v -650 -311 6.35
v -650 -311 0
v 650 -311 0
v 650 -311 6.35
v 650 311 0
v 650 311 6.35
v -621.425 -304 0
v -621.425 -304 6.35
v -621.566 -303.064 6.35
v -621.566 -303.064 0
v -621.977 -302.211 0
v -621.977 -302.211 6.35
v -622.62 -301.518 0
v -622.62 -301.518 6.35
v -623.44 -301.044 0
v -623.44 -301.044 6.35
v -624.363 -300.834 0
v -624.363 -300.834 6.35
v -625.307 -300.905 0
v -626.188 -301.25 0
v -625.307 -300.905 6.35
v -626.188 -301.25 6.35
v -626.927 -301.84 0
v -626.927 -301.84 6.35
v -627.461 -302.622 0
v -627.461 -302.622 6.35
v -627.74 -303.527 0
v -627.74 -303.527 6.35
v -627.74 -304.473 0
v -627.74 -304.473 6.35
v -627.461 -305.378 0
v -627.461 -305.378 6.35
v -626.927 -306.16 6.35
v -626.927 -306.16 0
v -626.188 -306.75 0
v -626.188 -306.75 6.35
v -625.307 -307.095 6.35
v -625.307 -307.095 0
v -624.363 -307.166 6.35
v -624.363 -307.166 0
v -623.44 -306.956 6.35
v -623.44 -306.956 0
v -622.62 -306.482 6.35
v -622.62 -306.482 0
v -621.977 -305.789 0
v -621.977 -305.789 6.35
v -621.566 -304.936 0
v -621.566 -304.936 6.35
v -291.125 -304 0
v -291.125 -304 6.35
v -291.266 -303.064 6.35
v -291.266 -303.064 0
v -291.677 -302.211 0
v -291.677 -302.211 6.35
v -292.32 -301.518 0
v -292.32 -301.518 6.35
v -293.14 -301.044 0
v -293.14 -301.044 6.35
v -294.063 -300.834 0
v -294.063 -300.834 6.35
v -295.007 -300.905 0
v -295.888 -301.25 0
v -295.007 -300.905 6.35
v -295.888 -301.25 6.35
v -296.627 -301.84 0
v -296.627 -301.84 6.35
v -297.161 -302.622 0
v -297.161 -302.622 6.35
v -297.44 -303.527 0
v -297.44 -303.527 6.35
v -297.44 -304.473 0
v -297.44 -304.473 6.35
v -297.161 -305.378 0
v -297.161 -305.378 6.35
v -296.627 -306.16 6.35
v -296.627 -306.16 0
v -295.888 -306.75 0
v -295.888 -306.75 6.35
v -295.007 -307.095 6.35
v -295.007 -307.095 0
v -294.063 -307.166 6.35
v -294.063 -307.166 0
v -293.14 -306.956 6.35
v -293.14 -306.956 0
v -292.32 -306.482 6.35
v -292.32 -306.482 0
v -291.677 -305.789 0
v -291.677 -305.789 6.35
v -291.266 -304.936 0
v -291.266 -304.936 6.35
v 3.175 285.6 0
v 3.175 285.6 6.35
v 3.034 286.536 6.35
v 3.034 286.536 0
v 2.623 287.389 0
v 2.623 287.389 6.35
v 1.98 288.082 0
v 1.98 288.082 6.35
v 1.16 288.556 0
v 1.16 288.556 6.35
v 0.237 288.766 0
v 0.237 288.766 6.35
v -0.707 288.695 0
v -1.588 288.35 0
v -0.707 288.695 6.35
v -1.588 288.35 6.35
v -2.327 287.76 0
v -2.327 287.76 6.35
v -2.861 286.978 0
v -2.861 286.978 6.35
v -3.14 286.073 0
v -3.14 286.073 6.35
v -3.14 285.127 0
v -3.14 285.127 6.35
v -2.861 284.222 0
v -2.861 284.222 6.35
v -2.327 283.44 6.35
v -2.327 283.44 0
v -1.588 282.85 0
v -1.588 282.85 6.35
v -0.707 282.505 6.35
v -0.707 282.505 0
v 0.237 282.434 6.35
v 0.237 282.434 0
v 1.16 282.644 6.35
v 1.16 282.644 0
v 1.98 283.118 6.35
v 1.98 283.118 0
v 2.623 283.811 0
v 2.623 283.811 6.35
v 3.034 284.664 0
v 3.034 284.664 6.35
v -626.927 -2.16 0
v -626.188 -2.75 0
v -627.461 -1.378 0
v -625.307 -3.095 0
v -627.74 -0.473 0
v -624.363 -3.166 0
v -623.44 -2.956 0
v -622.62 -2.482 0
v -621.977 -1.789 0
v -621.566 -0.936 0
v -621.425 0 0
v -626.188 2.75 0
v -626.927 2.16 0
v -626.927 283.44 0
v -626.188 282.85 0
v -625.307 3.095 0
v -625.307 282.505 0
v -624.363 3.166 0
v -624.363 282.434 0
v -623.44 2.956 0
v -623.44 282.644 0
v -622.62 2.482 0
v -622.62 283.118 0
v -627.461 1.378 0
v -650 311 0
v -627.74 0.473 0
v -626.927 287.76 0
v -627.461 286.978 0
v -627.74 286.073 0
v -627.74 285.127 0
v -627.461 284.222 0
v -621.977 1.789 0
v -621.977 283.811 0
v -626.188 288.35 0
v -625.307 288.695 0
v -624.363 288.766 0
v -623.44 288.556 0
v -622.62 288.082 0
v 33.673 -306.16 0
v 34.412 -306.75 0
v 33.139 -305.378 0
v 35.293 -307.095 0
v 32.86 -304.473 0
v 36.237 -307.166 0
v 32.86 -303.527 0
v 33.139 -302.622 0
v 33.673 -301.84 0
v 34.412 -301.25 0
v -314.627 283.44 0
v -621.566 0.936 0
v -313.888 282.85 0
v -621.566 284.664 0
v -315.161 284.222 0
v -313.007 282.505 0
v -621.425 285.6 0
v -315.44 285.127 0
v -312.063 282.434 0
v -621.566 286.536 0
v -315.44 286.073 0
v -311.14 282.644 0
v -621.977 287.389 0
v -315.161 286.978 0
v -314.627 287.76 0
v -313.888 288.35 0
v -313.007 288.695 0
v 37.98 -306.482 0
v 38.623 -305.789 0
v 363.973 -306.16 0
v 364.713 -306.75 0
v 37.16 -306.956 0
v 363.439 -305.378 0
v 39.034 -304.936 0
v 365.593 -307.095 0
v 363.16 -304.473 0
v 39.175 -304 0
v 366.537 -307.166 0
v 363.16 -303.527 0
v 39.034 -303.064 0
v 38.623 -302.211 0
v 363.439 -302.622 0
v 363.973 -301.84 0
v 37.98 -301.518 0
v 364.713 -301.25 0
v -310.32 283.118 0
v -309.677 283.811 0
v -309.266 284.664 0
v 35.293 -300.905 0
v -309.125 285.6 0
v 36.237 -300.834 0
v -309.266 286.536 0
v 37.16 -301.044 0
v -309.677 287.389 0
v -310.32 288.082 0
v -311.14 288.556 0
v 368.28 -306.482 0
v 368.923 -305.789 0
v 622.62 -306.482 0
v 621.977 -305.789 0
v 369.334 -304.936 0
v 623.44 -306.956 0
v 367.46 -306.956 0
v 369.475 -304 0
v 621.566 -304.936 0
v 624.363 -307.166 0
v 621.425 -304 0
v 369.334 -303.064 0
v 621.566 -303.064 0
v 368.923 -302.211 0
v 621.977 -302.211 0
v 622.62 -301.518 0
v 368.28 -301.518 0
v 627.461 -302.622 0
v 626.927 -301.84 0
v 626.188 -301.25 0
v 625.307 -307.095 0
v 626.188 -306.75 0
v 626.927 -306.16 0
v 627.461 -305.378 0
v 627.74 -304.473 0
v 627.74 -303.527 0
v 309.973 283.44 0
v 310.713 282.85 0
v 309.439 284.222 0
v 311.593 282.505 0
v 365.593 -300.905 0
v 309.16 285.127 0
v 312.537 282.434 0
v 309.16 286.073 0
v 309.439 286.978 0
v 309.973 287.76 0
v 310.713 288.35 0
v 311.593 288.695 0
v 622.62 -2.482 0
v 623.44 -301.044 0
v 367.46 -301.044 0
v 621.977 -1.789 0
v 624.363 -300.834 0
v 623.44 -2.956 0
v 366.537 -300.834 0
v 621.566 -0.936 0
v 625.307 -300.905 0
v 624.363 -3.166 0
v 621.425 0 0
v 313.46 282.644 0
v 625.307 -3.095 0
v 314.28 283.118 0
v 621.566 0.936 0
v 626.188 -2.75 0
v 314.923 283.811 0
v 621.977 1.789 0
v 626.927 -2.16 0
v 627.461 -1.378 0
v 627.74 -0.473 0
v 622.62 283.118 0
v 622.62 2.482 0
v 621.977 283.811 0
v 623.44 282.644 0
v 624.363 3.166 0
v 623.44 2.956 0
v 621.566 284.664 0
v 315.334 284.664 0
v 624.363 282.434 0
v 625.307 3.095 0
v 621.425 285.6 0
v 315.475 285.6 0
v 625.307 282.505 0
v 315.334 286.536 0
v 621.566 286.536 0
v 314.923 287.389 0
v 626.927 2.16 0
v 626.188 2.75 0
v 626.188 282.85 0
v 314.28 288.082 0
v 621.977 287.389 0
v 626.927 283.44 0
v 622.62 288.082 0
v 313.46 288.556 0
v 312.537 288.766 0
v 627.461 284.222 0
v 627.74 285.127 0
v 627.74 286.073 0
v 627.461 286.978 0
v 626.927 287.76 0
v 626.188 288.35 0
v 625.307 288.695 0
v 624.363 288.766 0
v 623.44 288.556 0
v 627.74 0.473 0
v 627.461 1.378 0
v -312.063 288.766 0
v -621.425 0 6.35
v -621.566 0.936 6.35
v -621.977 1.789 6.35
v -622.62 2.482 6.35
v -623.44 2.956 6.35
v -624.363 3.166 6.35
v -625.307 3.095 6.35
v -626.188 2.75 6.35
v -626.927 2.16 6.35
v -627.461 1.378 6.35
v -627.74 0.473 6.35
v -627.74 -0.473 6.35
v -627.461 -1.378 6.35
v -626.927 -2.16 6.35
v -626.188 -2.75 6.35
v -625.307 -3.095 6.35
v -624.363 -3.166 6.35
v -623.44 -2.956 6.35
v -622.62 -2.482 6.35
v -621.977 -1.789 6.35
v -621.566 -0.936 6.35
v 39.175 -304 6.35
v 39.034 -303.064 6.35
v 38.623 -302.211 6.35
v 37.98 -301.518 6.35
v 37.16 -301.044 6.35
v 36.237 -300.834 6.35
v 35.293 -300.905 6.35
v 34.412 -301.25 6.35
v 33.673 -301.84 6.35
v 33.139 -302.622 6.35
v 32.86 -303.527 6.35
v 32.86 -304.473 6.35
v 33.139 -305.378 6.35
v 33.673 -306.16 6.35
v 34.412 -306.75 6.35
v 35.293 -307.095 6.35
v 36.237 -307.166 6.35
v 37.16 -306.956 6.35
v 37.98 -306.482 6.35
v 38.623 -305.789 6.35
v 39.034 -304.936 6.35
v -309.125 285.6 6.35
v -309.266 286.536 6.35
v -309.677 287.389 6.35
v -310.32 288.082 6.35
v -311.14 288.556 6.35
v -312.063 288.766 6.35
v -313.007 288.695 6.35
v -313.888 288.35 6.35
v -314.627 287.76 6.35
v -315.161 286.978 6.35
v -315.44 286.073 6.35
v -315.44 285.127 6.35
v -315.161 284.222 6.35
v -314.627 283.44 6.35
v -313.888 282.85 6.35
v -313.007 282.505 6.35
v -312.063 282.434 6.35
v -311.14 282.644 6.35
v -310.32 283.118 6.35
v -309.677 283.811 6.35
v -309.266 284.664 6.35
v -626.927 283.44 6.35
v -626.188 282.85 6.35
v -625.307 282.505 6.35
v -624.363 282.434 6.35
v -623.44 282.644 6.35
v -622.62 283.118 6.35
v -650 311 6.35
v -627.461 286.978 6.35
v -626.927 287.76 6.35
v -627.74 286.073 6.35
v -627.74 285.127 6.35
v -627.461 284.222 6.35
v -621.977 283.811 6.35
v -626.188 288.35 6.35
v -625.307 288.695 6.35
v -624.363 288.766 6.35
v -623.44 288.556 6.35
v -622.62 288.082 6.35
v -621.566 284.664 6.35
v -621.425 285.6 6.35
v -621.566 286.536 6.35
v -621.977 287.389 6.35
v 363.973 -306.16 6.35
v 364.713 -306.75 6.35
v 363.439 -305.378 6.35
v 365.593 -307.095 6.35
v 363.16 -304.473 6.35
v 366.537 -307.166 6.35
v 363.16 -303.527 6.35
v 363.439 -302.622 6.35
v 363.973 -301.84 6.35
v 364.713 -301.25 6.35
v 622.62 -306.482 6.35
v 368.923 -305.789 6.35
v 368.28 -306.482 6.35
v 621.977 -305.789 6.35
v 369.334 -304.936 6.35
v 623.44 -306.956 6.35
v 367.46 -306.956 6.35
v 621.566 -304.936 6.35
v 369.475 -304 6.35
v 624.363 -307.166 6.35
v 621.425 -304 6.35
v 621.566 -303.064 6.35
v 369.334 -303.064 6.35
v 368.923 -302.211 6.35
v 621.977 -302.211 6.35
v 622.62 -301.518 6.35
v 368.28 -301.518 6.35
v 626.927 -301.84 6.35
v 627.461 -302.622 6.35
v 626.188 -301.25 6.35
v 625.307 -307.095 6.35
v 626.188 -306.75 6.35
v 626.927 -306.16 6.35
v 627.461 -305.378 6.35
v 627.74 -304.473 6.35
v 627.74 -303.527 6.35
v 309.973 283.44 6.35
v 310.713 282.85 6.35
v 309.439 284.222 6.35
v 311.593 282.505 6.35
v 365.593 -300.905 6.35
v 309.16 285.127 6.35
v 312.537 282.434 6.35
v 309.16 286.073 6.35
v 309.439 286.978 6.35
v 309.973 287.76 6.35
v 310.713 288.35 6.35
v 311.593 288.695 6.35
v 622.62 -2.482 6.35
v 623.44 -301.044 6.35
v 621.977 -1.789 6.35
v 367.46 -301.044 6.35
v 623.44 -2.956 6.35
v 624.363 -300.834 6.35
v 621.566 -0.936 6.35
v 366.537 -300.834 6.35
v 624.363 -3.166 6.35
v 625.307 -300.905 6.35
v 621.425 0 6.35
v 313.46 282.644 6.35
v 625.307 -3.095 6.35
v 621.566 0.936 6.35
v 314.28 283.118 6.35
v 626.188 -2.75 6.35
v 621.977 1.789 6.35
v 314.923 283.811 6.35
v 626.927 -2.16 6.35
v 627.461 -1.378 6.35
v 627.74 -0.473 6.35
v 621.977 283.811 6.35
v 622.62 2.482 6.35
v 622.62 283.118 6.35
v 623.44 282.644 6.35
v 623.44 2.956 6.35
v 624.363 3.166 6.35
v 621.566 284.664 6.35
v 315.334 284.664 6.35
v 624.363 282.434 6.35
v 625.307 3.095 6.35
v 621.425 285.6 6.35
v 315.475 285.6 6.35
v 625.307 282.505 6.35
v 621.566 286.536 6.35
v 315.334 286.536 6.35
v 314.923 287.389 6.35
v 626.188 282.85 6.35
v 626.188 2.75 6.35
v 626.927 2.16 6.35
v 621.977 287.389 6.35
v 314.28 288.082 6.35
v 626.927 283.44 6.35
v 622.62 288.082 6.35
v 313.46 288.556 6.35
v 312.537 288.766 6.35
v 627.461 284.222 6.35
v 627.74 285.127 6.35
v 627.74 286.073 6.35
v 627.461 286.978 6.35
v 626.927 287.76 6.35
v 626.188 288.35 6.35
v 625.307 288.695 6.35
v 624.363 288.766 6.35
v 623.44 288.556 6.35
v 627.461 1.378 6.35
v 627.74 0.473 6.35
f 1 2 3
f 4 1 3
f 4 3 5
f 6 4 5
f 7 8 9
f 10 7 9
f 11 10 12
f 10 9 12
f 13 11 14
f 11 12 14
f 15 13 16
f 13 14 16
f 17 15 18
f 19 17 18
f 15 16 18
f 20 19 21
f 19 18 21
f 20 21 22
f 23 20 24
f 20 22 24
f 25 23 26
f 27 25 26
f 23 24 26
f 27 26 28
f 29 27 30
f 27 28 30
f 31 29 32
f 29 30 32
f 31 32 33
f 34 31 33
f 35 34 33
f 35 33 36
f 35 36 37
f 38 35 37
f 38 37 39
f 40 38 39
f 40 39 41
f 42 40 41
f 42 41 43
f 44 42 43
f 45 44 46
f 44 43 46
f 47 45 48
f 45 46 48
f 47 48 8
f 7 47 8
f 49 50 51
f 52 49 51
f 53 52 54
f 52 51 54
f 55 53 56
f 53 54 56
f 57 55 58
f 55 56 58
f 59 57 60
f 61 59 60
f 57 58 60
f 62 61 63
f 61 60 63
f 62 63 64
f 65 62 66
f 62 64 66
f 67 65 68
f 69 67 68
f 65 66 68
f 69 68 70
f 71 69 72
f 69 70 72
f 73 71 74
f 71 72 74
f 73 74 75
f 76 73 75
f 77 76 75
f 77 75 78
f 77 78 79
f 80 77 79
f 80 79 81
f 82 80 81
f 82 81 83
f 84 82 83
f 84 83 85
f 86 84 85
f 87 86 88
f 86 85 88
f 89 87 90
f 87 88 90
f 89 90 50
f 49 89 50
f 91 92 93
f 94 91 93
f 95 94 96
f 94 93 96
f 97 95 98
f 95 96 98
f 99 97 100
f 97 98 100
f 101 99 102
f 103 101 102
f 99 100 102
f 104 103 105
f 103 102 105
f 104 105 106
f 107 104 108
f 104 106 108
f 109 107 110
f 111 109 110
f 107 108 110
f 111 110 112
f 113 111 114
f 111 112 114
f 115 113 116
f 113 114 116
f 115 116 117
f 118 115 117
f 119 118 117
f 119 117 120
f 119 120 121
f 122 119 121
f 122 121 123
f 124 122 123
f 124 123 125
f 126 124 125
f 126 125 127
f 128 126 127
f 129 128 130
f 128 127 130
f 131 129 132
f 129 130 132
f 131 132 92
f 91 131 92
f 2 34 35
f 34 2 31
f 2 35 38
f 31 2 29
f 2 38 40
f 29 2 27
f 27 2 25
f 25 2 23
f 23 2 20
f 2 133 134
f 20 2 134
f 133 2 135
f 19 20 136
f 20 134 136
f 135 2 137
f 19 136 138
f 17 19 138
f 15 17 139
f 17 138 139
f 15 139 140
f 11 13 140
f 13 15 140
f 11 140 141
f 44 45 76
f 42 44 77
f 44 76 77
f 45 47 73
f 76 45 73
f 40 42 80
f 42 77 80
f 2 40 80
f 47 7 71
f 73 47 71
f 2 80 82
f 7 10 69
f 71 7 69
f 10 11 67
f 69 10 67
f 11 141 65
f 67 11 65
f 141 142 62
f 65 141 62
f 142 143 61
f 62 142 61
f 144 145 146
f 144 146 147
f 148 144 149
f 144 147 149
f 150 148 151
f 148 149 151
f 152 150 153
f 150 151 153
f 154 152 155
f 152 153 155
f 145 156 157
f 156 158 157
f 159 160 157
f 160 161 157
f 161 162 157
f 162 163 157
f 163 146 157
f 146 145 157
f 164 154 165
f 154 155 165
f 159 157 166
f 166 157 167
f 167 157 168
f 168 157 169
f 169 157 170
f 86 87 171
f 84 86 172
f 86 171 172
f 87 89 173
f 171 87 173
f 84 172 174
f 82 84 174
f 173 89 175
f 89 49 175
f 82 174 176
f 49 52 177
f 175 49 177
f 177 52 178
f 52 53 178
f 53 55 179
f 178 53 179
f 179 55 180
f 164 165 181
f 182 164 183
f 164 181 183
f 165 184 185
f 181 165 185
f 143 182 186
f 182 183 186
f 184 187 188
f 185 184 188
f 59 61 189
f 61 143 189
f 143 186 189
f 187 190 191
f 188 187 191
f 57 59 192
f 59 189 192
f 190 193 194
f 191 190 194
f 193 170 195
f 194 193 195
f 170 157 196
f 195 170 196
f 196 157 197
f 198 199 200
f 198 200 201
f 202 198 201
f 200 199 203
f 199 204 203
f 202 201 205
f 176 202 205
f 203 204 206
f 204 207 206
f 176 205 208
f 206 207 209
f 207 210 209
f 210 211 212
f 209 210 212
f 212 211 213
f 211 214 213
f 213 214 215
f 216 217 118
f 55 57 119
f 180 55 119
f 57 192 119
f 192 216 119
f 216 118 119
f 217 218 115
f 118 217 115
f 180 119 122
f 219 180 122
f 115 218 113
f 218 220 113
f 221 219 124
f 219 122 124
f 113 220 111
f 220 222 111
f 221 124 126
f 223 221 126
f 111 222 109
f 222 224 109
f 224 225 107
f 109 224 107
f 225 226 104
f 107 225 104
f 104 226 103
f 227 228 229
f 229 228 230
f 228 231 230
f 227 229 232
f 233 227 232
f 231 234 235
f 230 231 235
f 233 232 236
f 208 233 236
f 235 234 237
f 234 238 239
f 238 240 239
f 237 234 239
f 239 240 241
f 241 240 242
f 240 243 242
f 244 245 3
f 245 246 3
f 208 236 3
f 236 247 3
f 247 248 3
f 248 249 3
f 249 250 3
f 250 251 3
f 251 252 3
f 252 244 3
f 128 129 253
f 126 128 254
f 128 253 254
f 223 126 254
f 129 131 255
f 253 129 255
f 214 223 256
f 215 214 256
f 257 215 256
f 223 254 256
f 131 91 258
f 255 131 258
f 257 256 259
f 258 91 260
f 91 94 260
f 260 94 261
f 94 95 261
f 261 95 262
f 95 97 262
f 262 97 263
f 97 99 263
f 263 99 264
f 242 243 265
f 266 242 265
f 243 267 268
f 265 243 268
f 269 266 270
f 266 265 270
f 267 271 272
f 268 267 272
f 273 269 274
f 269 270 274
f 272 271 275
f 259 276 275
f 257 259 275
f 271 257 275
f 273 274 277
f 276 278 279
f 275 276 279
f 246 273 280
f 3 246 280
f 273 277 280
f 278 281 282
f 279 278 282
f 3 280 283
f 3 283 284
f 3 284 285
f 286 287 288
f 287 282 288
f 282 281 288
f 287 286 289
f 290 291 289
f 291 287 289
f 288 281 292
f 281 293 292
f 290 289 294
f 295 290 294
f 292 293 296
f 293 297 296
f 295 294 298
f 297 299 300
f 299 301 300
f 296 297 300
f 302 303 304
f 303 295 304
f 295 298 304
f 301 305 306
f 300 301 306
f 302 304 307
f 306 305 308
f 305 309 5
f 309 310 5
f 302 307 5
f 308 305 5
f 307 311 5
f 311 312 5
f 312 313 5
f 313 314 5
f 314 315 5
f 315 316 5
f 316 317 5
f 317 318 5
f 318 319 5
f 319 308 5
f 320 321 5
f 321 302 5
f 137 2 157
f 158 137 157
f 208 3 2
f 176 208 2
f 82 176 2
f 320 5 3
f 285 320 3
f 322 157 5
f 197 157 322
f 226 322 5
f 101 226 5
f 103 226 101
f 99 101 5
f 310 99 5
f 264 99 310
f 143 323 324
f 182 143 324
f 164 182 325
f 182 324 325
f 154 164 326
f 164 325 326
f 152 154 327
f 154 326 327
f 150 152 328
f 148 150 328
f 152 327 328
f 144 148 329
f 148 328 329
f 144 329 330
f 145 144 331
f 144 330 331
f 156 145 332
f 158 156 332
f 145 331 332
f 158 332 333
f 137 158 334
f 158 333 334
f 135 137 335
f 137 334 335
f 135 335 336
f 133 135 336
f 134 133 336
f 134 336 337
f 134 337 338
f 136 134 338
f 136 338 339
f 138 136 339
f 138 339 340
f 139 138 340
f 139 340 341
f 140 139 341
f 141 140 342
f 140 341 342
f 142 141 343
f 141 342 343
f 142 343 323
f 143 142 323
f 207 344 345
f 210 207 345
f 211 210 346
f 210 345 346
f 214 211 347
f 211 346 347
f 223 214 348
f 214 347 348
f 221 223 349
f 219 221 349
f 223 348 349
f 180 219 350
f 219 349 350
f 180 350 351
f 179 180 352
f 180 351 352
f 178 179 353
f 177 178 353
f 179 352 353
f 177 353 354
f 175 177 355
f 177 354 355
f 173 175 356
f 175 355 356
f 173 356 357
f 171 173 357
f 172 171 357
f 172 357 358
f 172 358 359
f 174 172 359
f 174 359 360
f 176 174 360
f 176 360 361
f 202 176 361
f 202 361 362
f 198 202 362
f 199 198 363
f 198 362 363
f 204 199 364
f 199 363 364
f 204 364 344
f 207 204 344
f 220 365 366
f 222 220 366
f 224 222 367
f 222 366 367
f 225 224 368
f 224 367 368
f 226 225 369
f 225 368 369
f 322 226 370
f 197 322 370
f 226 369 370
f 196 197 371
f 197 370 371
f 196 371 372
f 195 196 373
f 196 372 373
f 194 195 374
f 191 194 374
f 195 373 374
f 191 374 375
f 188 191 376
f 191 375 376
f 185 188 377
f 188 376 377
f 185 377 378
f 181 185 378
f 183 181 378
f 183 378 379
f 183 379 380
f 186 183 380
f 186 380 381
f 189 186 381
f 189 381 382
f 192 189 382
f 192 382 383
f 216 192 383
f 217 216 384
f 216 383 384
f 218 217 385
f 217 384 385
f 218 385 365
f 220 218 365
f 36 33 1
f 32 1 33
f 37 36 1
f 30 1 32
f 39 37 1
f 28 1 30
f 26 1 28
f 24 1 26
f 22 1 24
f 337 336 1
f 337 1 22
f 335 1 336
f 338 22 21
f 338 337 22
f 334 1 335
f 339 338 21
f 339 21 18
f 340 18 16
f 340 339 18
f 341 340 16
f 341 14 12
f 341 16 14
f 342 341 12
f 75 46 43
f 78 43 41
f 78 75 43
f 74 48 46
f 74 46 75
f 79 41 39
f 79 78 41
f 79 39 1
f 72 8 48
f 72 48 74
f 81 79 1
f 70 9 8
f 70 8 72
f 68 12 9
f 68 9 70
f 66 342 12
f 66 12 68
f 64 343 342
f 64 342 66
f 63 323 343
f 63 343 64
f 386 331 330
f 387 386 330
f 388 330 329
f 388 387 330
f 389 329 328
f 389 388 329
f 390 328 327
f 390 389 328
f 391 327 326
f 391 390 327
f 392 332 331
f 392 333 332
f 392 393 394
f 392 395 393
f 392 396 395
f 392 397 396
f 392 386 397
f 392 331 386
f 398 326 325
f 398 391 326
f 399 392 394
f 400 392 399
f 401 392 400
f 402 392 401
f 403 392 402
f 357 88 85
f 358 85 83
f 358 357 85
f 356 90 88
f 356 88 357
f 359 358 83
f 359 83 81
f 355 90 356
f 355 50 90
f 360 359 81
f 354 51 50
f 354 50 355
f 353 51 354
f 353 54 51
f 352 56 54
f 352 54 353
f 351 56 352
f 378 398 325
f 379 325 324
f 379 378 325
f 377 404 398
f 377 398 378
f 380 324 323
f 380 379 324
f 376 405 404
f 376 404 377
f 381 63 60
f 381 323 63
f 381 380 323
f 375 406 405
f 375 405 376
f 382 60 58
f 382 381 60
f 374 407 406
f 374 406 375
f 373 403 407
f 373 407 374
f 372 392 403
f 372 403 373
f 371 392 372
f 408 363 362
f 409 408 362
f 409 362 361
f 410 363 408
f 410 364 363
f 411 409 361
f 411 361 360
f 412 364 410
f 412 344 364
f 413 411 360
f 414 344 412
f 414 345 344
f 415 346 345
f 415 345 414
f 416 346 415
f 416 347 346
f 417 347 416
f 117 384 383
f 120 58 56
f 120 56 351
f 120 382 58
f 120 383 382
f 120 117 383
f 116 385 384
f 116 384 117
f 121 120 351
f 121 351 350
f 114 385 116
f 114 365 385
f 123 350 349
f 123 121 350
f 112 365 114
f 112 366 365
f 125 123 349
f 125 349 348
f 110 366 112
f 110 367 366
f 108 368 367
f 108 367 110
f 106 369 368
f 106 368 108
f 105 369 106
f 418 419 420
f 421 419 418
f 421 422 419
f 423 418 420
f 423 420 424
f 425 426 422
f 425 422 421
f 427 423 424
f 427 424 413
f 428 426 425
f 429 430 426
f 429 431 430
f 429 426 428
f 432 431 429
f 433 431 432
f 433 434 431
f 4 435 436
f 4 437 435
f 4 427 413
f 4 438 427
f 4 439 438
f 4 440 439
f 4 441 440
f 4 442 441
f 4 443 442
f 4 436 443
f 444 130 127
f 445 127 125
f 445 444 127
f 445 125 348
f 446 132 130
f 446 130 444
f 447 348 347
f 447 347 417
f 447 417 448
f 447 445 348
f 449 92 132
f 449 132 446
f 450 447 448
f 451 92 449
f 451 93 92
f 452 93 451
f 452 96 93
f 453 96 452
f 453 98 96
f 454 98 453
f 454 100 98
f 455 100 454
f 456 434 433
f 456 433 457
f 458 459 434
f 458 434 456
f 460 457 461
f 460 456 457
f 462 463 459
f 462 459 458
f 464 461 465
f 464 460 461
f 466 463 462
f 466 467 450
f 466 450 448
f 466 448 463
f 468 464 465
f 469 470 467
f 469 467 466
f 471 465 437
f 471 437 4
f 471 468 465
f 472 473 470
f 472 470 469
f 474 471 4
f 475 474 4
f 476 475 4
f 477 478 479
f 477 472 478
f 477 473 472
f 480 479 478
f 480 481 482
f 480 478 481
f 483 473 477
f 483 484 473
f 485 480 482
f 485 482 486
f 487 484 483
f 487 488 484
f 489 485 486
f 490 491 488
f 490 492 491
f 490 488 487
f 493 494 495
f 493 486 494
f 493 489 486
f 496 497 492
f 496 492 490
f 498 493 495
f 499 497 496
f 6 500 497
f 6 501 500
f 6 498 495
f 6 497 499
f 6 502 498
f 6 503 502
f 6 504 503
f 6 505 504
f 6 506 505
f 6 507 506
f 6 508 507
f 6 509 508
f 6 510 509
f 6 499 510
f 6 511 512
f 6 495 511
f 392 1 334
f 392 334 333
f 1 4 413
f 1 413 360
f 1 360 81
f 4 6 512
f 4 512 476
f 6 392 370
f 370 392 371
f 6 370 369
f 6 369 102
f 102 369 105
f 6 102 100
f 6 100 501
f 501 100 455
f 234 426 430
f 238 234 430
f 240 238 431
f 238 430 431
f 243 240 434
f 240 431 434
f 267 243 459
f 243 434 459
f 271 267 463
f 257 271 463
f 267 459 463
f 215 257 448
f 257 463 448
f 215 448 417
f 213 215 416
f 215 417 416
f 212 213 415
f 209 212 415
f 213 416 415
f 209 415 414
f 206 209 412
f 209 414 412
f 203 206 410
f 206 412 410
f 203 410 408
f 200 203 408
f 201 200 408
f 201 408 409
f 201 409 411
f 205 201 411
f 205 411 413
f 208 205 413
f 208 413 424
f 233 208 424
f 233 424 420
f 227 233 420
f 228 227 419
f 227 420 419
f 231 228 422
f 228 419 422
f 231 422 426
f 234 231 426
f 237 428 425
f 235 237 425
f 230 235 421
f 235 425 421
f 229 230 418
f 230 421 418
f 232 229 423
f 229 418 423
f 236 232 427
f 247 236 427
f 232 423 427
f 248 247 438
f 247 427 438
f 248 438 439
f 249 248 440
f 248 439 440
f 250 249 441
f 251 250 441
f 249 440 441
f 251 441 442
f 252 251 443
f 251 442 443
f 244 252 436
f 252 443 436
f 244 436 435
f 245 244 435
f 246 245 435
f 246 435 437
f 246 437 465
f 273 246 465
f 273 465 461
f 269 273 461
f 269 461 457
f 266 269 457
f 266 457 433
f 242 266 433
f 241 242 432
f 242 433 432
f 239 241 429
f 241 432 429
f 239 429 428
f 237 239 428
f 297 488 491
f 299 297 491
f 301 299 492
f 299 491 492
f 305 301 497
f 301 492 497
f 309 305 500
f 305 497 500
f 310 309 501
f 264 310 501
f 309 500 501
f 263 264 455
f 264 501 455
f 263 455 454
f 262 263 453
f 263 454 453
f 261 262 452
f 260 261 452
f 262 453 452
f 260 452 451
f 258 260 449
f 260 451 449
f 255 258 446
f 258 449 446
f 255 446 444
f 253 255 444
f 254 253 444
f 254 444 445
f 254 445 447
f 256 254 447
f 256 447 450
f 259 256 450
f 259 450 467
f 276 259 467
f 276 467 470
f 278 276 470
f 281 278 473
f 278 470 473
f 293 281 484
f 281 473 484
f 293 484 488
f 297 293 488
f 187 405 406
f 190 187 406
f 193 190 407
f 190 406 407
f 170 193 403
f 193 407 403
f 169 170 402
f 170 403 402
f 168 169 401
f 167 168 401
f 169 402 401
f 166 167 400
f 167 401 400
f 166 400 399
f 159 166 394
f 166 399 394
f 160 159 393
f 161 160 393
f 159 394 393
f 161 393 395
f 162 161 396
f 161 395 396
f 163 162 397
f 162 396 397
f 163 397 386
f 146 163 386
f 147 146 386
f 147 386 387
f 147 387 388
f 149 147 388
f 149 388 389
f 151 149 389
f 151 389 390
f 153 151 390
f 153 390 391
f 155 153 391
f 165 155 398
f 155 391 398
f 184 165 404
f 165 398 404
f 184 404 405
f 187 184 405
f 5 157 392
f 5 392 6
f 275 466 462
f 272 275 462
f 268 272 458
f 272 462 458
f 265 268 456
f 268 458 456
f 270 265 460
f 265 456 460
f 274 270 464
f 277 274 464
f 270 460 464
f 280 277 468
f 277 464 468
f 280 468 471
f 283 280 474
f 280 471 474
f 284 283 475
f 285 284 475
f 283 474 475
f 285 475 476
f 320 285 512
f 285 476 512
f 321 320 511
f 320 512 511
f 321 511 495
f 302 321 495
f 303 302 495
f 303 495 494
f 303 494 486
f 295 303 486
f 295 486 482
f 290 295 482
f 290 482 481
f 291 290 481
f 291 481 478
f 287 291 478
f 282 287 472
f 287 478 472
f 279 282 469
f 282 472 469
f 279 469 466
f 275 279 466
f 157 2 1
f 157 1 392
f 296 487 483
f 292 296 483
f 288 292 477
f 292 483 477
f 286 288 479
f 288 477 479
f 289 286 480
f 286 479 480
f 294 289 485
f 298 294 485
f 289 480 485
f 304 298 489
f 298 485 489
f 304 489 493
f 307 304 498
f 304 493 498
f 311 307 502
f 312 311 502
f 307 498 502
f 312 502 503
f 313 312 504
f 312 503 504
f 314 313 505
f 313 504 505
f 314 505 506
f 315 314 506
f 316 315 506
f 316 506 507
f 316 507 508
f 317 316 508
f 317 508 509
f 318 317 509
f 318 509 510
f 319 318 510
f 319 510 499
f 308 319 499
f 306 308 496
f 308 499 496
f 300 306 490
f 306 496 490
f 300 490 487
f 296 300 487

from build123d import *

# Parameters (mm, degrees)
CROQUIS1_W              = 1300
CROQUIS1_H              = 622
SALIENTE_EXTRUIR1_DEPTH = 6.35
CROQUIS2_R              = 3.175
CORTAR_EXTRUIR2_DEPTH   = 6.35


with BuildPart() as part:
    # Croquis1 → Saliente-Extruir1 (new body)
    with BuildSketch(Plane.XY):
        Rectangle(CROQUIS1_W, CROQUIS1_H)
    extrude(amount=SALIENTE_EXTRUIR1_DEPTH)

    # Croquis2 → Cortar-Extruir2 (cut)
    with BuildSketch(Plane.XY.offset(6.35)):
        with Locations((-624.6, 285.6)):
            Circle(CROQUIS2_R)
        with Locations((0, 285.6)):
            Circle(CROQUIS2_R)
        with Locations(Location((624.6, 285.6, 0), (0, 0, 180))):
            Circle(CROQUIS2_R)
        with Locations((-312.3, 285.6)):
            Circle(CROQUIS2_R)
        with Locations((312.3, 285.6)):
            Circle(CROQUIS2_R)
        with Locations((-624.6, 0)):
            Circle(CROQUIS2_R)
        with Locations(Location((624.6, 0, 0), (0, 0, 180))):
            Circle(CROQUIS2_R)
        with Locations((-624.6, -304)):
            Circle(CROQUIS2_R)
        with Locations(Location((624.6, -304, 0), (0, 0, 180))):
            Circle(CROQUIS2_R)
        with Locations((-294.3, -304)):
            Circle(CROQUIS2_R)
        with Locations((36, -304)):
            Circle(CROQUIS2_R)
        with Locations((366.3, -304)):
            Circle(CROQUIS2_R)
    extrude(amount=-CORTAR_EXTRUIR2_DEPTH, mode=Mode.SUBTRACT)


solid = part.part
